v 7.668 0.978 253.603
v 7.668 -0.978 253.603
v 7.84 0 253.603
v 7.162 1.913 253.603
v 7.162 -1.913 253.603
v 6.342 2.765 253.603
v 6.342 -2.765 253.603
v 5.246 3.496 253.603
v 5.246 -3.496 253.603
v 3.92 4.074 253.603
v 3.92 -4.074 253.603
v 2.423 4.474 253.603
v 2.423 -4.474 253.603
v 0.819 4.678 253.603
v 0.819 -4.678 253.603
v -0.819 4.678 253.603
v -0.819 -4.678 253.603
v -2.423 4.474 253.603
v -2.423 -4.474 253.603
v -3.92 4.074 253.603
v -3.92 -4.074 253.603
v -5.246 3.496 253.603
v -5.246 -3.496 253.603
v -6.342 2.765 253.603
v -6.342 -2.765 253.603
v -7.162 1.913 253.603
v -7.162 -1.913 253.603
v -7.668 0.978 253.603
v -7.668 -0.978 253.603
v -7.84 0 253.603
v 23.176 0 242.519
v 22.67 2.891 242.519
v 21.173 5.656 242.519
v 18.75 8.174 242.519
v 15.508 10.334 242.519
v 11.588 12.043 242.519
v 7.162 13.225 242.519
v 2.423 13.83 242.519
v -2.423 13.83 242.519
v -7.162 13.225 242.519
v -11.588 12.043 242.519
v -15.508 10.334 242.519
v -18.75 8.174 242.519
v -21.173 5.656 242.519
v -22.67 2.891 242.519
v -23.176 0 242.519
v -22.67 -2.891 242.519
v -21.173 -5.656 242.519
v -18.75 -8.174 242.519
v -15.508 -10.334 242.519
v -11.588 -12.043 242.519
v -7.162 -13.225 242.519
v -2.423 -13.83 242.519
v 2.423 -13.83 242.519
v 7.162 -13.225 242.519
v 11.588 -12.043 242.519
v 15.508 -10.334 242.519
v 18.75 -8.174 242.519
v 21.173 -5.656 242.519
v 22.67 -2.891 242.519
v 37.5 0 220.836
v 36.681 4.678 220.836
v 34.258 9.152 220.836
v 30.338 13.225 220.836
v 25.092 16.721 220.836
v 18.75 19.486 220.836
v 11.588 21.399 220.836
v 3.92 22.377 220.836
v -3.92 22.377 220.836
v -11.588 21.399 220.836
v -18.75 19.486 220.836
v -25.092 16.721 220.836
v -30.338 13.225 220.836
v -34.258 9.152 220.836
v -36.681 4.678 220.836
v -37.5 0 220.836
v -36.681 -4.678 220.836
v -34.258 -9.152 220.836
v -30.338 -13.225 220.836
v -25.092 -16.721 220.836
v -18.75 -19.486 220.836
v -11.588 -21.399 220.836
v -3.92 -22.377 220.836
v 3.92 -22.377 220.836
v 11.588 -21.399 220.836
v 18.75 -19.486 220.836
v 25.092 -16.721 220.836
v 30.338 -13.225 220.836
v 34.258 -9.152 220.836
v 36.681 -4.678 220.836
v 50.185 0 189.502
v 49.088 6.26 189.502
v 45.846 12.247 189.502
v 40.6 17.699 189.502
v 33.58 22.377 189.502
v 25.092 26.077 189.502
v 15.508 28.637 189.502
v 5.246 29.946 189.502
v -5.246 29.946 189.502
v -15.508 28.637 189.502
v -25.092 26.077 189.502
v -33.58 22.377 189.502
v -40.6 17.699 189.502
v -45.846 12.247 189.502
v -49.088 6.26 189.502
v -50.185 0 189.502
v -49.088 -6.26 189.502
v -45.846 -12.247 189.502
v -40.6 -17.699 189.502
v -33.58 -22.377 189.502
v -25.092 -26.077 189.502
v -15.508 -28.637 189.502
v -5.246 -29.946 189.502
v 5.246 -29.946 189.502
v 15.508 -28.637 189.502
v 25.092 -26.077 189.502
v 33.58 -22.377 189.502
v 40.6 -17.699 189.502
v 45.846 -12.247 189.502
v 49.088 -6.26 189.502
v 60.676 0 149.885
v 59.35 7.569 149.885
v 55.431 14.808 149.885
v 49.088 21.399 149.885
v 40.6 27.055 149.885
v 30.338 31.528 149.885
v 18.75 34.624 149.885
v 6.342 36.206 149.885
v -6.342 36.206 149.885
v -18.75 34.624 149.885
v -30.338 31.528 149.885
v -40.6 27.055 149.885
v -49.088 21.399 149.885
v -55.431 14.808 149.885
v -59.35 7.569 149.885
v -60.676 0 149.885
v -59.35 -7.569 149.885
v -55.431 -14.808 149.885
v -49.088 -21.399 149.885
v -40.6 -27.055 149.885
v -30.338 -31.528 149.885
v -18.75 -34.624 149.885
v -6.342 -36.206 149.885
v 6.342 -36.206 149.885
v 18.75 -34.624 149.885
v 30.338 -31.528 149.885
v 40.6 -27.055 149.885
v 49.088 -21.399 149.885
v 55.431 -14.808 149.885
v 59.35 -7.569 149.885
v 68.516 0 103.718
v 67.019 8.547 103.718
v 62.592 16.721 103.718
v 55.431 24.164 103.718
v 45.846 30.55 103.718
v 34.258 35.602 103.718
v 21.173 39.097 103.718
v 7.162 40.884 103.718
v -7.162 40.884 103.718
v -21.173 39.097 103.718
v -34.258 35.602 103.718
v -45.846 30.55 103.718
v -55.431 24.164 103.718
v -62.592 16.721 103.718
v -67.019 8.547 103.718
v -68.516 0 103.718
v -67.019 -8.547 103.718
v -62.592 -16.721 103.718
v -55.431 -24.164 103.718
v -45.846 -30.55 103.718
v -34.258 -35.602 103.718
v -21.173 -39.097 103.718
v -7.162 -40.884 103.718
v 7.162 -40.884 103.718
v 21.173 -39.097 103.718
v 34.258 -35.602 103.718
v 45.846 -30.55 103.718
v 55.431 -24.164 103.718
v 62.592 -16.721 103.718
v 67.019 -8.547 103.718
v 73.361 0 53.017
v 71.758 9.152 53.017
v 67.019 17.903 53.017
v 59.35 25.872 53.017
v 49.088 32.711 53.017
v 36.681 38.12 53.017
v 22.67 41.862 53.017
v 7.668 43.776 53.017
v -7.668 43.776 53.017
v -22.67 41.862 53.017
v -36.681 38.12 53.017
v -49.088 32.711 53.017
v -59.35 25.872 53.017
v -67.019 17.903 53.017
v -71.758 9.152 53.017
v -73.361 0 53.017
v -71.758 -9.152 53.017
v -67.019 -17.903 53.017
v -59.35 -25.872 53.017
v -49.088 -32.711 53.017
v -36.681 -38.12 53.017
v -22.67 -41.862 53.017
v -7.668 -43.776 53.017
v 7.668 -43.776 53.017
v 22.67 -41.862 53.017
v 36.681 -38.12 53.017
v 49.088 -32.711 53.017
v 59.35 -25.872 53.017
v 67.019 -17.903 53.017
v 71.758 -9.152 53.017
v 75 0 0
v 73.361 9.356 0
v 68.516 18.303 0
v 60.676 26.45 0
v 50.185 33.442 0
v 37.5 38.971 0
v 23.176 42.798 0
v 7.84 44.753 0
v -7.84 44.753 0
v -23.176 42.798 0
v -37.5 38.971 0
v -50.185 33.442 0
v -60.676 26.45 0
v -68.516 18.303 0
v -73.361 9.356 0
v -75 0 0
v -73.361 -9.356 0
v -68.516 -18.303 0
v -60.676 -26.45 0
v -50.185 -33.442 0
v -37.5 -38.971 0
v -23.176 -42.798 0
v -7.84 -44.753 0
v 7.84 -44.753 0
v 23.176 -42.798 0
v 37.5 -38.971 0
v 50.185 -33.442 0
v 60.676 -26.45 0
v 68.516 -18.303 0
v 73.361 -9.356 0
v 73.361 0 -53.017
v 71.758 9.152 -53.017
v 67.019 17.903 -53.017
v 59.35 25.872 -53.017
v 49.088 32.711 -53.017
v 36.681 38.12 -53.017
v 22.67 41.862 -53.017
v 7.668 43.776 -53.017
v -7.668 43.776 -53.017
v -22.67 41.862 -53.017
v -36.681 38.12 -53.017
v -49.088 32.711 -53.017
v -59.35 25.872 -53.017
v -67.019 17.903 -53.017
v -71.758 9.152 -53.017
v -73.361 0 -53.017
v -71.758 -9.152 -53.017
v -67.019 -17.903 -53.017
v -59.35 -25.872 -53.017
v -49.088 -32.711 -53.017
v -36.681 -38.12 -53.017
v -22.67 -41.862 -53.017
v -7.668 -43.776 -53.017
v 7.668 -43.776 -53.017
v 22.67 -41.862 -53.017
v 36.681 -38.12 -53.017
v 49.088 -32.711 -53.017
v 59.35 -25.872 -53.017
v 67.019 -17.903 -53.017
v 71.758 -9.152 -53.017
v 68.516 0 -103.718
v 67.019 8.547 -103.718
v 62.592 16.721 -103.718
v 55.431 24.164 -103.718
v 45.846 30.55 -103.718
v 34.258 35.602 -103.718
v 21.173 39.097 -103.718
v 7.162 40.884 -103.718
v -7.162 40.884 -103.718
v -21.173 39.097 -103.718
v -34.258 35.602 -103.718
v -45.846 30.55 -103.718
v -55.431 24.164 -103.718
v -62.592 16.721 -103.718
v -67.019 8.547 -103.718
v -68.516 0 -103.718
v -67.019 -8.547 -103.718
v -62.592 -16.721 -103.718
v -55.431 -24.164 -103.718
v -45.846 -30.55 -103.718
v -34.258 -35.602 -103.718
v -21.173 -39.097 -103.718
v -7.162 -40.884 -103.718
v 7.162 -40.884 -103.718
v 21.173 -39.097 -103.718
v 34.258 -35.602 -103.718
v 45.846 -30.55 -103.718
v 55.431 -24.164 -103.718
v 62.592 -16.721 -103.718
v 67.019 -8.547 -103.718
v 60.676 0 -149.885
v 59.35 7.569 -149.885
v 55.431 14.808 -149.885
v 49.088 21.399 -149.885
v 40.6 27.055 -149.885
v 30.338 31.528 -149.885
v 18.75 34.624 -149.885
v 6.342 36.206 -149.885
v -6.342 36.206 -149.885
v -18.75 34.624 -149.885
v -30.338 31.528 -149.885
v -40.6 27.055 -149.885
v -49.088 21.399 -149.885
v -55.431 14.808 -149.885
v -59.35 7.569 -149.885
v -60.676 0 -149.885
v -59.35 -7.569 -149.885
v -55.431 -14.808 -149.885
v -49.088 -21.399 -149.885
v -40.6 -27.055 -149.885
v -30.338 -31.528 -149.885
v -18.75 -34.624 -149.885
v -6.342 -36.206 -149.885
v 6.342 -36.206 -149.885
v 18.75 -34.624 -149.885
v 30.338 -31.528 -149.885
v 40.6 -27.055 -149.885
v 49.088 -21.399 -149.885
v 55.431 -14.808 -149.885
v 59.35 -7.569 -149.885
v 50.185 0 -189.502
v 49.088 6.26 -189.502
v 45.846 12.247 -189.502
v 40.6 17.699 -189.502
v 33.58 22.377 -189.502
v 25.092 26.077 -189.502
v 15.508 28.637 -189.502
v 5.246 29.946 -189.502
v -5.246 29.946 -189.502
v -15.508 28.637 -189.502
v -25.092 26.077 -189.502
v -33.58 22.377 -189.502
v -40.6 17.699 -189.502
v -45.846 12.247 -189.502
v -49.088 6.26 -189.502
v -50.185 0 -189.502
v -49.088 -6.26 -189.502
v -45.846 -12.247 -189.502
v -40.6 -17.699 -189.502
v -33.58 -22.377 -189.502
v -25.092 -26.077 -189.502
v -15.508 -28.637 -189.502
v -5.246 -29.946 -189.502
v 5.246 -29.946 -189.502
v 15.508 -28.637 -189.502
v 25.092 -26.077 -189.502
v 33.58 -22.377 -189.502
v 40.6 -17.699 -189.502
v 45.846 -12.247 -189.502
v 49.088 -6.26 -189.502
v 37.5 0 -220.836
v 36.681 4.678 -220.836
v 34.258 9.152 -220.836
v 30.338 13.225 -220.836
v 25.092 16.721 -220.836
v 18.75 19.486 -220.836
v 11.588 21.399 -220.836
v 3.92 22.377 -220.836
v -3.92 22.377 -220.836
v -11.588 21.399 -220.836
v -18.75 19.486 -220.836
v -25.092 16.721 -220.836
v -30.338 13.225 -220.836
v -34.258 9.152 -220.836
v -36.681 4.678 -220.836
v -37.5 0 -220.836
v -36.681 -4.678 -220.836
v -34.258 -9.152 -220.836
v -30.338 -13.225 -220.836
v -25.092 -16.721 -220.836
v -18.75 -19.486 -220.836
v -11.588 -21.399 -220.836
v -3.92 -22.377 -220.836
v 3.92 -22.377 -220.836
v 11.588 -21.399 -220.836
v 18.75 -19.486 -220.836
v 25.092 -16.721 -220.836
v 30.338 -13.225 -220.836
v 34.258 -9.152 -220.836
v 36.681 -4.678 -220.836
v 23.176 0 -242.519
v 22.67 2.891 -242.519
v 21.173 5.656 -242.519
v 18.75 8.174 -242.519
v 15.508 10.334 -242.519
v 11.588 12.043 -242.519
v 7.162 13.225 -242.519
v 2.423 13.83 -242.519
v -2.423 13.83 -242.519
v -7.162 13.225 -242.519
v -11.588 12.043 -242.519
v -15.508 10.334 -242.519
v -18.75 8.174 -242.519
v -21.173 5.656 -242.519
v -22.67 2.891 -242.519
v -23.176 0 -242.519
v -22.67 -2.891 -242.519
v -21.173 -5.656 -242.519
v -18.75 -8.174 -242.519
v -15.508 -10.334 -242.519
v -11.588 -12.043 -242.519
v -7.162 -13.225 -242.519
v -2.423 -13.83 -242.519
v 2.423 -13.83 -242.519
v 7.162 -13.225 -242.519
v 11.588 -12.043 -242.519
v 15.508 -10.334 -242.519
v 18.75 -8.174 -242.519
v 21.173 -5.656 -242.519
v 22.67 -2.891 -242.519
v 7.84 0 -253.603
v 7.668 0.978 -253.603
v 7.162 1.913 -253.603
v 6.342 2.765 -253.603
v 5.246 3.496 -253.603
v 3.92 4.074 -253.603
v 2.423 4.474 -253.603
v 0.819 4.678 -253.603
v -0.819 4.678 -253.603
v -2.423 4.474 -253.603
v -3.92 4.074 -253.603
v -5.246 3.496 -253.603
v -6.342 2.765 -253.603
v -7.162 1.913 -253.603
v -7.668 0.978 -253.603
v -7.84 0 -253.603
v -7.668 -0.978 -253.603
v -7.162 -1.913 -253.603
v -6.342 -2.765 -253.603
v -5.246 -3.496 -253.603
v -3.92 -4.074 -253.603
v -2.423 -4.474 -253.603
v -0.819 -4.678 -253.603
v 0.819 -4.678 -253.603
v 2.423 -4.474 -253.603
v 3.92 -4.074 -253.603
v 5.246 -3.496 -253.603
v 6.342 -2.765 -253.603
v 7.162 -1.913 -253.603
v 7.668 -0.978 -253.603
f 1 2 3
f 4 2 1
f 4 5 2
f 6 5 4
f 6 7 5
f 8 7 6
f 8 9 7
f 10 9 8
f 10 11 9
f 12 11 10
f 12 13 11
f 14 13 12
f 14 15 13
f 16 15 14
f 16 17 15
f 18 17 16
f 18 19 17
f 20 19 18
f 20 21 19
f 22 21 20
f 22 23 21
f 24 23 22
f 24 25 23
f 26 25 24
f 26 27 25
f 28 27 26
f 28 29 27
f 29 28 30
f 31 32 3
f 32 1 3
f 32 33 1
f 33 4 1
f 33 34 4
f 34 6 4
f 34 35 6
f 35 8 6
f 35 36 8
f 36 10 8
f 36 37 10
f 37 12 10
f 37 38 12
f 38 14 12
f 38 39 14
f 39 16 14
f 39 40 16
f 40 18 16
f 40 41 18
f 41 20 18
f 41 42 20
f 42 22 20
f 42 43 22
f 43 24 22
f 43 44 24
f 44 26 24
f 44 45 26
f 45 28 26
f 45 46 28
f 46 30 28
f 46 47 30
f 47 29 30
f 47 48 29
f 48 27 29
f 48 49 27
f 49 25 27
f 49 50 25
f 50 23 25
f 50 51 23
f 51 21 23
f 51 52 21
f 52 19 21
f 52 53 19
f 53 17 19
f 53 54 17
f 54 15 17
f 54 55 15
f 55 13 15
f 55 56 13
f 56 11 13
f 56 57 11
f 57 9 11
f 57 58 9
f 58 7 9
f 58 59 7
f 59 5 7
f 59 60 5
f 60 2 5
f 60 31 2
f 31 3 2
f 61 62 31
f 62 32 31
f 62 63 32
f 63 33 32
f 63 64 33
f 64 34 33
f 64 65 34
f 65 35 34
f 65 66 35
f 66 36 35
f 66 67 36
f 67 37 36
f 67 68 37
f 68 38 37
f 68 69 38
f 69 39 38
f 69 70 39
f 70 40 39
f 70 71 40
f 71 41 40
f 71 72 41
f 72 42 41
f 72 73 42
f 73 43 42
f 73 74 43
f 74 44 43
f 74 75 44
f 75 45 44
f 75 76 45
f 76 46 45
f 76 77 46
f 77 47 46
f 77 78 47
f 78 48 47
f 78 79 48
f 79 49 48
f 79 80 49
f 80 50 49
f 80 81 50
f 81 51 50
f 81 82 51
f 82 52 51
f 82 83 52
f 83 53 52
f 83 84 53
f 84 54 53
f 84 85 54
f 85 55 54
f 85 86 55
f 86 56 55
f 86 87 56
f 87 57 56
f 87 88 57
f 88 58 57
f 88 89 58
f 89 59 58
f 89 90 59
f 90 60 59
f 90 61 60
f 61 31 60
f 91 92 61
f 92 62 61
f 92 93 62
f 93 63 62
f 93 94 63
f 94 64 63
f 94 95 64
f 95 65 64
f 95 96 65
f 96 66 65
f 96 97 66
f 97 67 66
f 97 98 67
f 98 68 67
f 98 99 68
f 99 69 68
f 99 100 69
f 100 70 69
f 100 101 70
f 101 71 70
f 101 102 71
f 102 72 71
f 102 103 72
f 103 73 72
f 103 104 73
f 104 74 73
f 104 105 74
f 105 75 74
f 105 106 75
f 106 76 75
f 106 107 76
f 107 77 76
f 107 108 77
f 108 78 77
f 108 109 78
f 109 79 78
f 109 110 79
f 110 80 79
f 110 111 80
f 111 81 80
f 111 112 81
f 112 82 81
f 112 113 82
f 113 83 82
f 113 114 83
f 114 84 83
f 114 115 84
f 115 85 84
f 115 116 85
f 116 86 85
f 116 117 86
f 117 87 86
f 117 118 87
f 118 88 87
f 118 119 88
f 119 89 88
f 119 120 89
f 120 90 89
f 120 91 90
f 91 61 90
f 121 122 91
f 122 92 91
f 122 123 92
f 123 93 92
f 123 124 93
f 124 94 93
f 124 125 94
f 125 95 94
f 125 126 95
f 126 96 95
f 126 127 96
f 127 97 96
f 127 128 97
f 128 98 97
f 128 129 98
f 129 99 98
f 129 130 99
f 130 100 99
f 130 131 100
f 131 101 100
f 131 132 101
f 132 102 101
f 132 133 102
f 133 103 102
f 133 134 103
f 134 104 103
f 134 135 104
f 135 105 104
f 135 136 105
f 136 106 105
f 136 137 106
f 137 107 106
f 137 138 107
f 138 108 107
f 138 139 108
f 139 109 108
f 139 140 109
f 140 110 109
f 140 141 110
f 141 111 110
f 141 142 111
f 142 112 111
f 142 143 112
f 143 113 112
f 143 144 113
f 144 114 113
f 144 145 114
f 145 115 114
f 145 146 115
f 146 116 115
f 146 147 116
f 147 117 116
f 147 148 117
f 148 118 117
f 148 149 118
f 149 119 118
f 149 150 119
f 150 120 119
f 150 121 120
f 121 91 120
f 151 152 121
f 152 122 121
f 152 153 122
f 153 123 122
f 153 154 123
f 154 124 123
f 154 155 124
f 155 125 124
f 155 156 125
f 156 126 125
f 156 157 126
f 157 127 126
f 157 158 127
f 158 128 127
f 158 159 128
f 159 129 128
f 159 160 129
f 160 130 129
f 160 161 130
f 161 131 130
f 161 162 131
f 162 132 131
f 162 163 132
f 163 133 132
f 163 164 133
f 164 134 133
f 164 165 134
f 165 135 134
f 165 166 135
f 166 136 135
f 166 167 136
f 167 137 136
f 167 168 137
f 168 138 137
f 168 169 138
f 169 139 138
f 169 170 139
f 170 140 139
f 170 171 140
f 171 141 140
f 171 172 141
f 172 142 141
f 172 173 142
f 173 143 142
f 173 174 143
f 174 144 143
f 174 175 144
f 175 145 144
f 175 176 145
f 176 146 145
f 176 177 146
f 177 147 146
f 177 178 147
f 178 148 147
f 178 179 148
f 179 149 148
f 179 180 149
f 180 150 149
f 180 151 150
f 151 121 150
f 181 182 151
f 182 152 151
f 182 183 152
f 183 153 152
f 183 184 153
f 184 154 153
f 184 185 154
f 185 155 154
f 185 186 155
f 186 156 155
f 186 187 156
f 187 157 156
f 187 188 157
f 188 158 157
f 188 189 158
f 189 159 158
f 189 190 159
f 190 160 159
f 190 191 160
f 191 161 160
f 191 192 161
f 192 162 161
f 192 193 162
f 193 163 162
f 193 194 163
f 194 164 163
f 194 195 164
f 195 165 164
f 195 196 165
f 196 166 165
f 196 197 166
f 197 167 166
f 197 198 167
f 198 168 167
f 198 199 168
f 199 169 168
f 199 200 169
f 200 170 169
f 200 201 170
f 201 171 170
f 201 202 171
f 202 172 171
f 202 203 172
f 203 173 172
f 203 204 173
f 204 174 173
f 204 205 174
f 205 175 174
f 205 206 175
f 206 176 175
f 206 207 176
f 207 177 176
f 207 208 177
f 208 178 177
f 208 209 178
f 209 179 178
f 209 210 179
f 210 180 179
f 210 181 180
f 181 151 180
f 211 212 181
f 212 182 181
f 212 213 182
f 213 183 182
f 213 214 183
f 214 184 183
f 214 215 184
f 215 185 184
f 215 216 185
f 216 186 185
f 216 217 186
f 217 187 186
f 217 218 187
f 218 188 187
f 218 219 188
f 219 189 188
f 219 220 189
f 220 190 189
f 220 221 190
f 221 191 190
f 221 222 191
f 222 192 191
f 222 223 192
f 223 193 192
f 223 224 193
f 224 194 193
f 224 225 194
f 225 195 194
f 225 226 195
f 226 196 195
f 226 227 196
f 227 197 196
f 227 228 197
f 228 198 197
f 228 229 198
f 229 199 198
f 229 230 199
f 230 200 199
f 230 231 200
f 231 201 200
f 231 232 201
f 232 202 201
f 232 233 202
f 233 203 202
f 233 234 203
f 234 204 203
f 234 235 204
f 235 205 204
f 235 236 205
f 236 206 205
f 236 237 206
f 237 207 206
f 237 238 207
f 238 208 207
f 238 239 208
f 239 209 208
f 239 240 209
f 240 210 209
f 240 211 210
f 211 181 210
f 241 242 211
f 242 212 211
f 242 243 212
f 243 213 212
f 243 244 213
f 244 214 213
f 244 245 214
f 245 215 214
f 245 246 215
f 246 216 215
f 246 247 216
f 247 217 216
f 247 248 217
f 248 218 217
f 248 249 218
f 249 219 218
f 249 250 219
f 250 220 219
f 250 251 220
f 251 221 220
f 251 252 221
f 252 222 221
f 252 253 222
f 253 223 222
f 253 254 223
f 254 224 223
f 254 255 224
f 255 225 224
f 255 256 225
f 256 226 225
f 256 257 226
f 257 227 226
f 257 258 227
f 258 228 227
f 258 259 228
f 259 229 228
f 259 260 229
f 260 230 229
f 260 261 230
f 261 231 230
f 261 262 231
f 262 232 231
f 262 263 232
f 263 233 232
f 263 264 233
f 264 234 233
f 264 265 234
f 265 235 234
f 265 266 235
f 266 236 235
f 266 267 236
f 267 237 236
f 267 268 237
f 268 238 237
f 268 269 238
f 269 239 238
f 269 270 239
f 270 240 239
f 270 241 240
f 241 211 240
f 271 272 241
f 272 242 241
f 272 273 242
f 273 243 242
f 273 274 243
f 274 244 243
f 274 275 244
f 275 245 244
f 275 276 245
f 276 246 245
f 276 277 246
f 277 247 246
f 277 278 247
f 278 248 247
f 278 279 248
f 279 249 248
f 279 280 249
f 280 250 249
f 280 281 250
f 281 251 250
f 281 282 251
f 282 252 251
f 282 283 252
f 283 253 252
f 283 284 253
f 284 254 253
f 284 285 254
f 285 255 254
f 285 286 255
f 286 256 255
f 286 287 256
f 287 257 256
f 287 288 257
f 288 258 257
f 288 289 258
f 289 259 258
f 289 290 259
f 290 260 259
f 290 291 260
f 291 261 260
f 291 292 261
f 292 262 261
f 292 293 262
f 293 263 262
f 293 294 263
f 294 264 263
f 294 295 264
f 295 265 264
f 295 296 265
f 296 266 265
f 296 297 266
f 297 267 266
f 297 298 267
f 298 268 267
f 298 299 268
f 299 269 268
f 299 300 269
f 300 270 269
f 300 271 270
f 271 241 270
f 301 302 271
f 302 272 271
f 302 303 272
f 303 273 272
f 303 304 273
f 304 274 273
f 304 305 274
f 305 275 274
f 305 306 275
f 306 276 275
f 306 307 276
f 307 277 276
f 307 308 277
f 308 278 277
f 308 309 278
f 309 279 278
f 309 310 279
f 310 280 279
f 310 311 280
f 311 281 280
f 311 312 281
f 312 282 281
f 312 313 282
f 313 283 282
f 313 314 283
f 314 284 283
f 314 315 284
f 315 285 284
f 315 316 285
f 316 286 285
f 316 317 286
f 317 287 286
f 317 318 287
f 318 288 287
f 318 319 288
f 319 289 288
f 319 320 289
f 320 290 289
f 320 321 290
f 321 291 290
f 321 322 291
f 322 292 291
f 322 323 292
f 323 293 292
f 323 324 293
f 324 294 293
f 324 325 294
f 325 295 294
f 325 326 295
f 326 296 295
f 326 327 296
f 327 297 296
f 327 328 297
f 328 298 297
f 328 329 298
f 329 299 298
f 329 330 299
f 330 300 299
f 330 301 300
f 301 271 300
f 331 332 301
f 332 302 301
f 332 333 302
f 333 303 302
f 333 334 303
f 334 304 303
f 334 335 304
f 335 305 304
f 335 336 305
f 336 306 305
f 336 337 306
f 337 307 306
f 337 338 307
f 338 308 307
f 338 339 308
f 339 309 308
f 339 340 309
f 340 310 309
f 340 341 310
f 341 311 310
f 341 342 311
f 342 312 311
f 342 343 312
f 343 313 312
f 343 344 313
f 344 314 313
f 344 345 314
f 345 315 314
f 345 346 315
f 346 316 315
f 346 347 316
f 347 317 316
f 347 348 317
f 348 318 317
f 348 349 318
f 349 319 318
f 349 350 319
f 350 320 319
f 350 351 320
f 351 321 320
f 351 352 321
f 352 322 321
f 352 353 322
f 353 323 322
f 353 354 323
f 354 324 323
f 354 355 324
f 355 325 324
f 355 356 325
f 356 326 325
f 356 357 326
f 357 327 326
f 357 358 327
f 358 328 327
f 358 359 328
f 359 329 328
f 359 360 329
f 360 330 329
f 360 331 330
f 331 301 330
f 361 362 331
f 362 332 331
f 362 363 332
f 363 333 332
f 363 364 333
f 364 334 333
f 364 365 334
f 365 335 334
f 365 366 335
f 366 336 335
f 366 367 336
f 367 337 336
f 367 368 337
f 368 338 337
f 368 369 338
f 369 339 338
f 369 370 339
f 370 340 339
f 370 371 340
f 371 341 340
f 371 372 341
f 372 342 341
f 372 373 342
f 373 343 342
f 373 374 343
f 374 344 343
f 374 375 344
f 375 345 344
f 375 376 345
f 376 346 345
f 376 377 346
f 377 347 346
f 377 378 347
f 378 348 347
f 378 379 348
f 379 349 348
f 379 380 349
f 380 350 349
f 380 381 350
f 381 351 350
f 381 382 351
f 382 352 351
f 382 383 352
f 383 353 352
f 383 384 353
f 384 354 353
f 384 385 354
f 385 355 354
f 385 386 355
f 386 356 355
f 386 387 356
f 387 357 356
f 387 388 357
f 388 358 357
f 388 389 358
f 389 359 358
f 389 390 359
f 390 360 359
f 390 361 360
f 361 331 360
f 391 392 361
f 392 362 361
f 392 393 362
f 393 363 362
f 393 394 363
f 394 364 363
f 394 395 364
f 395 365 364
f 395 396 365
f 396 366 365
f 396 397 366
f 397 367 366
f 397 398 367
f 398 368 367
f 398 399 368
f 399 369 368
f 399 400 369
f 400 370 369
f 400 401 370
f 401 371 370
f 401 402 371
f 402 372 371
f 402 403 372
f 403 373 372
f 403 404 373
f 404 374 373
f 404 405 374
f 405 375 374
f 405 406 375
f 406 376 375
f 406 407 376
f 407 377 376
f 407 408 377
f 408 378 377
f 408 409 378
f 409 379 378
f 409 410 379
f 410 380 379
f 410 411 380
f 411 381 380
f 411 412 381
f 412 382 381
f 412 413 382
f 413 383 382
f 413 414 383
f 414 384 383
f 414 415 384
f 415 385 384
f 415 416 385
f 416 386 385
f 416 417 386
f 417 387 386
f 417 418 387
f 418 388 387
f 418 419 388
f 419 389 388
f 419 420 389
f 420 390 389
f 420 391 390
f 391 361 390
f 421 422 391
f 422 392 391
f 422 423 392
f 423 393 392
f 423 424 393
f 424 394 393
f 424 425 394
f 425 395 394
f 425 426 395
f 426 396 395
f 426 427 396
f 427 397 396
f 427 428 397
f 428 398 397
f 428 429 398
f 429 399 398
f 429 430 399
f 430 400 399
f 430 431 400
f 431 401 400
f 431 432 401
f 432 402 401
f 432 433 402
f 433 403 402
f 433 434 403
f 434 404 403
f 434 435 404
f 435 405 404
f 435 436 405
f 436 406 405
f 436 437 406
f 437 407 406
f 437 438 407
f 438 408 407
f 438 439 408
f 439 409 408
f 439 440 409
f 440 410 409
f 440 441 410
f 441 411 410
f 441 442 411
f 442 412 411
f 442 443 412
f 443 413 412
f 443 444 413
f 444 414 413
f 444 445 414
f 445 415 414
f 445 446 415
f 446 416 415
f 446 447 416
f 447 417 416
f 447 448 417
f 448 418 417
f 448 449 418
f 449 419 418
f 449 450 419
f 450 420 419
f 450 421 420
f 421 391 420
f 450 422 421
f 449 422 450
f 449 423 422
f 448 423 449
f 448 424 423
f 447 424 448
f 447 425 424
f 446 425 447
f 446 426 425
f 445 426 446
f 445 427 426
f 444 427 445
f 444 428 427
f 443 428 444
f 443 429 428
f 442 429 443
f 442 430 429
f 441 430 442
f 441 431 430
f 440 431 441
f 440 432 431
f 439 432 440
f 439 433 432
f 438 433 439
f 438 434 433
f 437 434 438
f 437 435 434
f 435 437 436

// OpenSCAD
// Generated by SolidPython 1.0.1 on 2020-07-29 00:46:46


scale(v = [5, 3, 17]) {
	sphere(r = 15);
}
/***********************************************
*********      SolidPython code:      **********
************************************************
 
# import packages: SolidPython
from solid import *
from solid.utils import *
from itertools import chain, combinations, permutations


class Resize:

    def __init__(self, scad_file):
        self.scad_file = scad_file
        #self.scad_file = import_scad(scad_file)
        # cone/cylinder param:
        self.r1 = 0
        self.r2 = 0
        self.h = 0
        # rectangular prism param:
        self.w = 0
        self.l = 0
        # ellipse param:
        self.r = 0

    # import OpenScad code (file name corresponds to shape)


    # classify shape + parameters
    def assign(self, param1, param2, param3):
        if self.scad_file == 'cone.scad':
            self.r1 = param1
            self.r2 = param2
            self.h = param3
        elif self.scad_file == 'cylinder.scad':
            self.r1 = param1
            self.r2 = param2
            self.h = param3
        elif self.scad_file == 'rectangularPrism.scad':
            self.h = param1
            self.l = param2
            self.w = param3
        else:
            self.r = param1
            self.h = param2

    # resize parameters
    def iterate(self):
        x = range(3, 20, 2)
        i = 1
        if self.scad_file == 'cone.scad':
            tempList = list(permutations(x, 2))
            for temp in tempList:
                param1 = temp[0]
                param2 = temp[1]
                filepath = 'produced_scad_files/' + 'cone' + str(param1) + '_' + str(param2) + '_' + '.scad'
                scad_render_to_file(cylinder(h=param1, r1=param2, r2=0), filepath)

        elif self.scad_file == 'cylinder.scad':
            tempList = list(permutations(x, 3))
            for temp in tempList:
                param1 = temp[0]
                param2 = temp[1]
                filepath = 'produced_scad_files/' + 'cylinder' + str(param1) + '_' + str(param2) + '_' + '.scad'
                scad_render_to_file(cylinder(h=param1, r1=param2, r2=param2), filepath)

        elif self.scad_file == 'rectangularPrism.scad':
            tempList = list(permutations(x, 3))
            for temp in tempList:
                param1 = temp[0]
                param2 = temp[1]
                param3 = temp[2]
                filepath = 'produced_scad_files/' + 'rectangularPrism' + str(param1) + '_' + str(param2) + '_' + str(
                    param3) + '.scad'
                scad_render_to_file(cube(size=(param1, param2, param3)), filepath)

        elif self.scad_file == 'ellipse.scad':
            tempList = list(permutations(x, 4))
            for temp in tempList:
                param1 = temp[0]
                param2 = temp[1]
                param3 = temp[2]
                param4 = temp[3]
                filepath = 'produced_scad_files/' + 'ellipse' + str(param1) + '_' + str(param2) + '_' + str(param3) + '_' + str(param4) + '.scad'
                scad_render_to_file(scale([param1, param2, param3])(sphere(r=param4)), filepath)

    def render_to_scadfile(self):
        scad_render_to_file(scad, 'example.scad') 
 
************************************************/
